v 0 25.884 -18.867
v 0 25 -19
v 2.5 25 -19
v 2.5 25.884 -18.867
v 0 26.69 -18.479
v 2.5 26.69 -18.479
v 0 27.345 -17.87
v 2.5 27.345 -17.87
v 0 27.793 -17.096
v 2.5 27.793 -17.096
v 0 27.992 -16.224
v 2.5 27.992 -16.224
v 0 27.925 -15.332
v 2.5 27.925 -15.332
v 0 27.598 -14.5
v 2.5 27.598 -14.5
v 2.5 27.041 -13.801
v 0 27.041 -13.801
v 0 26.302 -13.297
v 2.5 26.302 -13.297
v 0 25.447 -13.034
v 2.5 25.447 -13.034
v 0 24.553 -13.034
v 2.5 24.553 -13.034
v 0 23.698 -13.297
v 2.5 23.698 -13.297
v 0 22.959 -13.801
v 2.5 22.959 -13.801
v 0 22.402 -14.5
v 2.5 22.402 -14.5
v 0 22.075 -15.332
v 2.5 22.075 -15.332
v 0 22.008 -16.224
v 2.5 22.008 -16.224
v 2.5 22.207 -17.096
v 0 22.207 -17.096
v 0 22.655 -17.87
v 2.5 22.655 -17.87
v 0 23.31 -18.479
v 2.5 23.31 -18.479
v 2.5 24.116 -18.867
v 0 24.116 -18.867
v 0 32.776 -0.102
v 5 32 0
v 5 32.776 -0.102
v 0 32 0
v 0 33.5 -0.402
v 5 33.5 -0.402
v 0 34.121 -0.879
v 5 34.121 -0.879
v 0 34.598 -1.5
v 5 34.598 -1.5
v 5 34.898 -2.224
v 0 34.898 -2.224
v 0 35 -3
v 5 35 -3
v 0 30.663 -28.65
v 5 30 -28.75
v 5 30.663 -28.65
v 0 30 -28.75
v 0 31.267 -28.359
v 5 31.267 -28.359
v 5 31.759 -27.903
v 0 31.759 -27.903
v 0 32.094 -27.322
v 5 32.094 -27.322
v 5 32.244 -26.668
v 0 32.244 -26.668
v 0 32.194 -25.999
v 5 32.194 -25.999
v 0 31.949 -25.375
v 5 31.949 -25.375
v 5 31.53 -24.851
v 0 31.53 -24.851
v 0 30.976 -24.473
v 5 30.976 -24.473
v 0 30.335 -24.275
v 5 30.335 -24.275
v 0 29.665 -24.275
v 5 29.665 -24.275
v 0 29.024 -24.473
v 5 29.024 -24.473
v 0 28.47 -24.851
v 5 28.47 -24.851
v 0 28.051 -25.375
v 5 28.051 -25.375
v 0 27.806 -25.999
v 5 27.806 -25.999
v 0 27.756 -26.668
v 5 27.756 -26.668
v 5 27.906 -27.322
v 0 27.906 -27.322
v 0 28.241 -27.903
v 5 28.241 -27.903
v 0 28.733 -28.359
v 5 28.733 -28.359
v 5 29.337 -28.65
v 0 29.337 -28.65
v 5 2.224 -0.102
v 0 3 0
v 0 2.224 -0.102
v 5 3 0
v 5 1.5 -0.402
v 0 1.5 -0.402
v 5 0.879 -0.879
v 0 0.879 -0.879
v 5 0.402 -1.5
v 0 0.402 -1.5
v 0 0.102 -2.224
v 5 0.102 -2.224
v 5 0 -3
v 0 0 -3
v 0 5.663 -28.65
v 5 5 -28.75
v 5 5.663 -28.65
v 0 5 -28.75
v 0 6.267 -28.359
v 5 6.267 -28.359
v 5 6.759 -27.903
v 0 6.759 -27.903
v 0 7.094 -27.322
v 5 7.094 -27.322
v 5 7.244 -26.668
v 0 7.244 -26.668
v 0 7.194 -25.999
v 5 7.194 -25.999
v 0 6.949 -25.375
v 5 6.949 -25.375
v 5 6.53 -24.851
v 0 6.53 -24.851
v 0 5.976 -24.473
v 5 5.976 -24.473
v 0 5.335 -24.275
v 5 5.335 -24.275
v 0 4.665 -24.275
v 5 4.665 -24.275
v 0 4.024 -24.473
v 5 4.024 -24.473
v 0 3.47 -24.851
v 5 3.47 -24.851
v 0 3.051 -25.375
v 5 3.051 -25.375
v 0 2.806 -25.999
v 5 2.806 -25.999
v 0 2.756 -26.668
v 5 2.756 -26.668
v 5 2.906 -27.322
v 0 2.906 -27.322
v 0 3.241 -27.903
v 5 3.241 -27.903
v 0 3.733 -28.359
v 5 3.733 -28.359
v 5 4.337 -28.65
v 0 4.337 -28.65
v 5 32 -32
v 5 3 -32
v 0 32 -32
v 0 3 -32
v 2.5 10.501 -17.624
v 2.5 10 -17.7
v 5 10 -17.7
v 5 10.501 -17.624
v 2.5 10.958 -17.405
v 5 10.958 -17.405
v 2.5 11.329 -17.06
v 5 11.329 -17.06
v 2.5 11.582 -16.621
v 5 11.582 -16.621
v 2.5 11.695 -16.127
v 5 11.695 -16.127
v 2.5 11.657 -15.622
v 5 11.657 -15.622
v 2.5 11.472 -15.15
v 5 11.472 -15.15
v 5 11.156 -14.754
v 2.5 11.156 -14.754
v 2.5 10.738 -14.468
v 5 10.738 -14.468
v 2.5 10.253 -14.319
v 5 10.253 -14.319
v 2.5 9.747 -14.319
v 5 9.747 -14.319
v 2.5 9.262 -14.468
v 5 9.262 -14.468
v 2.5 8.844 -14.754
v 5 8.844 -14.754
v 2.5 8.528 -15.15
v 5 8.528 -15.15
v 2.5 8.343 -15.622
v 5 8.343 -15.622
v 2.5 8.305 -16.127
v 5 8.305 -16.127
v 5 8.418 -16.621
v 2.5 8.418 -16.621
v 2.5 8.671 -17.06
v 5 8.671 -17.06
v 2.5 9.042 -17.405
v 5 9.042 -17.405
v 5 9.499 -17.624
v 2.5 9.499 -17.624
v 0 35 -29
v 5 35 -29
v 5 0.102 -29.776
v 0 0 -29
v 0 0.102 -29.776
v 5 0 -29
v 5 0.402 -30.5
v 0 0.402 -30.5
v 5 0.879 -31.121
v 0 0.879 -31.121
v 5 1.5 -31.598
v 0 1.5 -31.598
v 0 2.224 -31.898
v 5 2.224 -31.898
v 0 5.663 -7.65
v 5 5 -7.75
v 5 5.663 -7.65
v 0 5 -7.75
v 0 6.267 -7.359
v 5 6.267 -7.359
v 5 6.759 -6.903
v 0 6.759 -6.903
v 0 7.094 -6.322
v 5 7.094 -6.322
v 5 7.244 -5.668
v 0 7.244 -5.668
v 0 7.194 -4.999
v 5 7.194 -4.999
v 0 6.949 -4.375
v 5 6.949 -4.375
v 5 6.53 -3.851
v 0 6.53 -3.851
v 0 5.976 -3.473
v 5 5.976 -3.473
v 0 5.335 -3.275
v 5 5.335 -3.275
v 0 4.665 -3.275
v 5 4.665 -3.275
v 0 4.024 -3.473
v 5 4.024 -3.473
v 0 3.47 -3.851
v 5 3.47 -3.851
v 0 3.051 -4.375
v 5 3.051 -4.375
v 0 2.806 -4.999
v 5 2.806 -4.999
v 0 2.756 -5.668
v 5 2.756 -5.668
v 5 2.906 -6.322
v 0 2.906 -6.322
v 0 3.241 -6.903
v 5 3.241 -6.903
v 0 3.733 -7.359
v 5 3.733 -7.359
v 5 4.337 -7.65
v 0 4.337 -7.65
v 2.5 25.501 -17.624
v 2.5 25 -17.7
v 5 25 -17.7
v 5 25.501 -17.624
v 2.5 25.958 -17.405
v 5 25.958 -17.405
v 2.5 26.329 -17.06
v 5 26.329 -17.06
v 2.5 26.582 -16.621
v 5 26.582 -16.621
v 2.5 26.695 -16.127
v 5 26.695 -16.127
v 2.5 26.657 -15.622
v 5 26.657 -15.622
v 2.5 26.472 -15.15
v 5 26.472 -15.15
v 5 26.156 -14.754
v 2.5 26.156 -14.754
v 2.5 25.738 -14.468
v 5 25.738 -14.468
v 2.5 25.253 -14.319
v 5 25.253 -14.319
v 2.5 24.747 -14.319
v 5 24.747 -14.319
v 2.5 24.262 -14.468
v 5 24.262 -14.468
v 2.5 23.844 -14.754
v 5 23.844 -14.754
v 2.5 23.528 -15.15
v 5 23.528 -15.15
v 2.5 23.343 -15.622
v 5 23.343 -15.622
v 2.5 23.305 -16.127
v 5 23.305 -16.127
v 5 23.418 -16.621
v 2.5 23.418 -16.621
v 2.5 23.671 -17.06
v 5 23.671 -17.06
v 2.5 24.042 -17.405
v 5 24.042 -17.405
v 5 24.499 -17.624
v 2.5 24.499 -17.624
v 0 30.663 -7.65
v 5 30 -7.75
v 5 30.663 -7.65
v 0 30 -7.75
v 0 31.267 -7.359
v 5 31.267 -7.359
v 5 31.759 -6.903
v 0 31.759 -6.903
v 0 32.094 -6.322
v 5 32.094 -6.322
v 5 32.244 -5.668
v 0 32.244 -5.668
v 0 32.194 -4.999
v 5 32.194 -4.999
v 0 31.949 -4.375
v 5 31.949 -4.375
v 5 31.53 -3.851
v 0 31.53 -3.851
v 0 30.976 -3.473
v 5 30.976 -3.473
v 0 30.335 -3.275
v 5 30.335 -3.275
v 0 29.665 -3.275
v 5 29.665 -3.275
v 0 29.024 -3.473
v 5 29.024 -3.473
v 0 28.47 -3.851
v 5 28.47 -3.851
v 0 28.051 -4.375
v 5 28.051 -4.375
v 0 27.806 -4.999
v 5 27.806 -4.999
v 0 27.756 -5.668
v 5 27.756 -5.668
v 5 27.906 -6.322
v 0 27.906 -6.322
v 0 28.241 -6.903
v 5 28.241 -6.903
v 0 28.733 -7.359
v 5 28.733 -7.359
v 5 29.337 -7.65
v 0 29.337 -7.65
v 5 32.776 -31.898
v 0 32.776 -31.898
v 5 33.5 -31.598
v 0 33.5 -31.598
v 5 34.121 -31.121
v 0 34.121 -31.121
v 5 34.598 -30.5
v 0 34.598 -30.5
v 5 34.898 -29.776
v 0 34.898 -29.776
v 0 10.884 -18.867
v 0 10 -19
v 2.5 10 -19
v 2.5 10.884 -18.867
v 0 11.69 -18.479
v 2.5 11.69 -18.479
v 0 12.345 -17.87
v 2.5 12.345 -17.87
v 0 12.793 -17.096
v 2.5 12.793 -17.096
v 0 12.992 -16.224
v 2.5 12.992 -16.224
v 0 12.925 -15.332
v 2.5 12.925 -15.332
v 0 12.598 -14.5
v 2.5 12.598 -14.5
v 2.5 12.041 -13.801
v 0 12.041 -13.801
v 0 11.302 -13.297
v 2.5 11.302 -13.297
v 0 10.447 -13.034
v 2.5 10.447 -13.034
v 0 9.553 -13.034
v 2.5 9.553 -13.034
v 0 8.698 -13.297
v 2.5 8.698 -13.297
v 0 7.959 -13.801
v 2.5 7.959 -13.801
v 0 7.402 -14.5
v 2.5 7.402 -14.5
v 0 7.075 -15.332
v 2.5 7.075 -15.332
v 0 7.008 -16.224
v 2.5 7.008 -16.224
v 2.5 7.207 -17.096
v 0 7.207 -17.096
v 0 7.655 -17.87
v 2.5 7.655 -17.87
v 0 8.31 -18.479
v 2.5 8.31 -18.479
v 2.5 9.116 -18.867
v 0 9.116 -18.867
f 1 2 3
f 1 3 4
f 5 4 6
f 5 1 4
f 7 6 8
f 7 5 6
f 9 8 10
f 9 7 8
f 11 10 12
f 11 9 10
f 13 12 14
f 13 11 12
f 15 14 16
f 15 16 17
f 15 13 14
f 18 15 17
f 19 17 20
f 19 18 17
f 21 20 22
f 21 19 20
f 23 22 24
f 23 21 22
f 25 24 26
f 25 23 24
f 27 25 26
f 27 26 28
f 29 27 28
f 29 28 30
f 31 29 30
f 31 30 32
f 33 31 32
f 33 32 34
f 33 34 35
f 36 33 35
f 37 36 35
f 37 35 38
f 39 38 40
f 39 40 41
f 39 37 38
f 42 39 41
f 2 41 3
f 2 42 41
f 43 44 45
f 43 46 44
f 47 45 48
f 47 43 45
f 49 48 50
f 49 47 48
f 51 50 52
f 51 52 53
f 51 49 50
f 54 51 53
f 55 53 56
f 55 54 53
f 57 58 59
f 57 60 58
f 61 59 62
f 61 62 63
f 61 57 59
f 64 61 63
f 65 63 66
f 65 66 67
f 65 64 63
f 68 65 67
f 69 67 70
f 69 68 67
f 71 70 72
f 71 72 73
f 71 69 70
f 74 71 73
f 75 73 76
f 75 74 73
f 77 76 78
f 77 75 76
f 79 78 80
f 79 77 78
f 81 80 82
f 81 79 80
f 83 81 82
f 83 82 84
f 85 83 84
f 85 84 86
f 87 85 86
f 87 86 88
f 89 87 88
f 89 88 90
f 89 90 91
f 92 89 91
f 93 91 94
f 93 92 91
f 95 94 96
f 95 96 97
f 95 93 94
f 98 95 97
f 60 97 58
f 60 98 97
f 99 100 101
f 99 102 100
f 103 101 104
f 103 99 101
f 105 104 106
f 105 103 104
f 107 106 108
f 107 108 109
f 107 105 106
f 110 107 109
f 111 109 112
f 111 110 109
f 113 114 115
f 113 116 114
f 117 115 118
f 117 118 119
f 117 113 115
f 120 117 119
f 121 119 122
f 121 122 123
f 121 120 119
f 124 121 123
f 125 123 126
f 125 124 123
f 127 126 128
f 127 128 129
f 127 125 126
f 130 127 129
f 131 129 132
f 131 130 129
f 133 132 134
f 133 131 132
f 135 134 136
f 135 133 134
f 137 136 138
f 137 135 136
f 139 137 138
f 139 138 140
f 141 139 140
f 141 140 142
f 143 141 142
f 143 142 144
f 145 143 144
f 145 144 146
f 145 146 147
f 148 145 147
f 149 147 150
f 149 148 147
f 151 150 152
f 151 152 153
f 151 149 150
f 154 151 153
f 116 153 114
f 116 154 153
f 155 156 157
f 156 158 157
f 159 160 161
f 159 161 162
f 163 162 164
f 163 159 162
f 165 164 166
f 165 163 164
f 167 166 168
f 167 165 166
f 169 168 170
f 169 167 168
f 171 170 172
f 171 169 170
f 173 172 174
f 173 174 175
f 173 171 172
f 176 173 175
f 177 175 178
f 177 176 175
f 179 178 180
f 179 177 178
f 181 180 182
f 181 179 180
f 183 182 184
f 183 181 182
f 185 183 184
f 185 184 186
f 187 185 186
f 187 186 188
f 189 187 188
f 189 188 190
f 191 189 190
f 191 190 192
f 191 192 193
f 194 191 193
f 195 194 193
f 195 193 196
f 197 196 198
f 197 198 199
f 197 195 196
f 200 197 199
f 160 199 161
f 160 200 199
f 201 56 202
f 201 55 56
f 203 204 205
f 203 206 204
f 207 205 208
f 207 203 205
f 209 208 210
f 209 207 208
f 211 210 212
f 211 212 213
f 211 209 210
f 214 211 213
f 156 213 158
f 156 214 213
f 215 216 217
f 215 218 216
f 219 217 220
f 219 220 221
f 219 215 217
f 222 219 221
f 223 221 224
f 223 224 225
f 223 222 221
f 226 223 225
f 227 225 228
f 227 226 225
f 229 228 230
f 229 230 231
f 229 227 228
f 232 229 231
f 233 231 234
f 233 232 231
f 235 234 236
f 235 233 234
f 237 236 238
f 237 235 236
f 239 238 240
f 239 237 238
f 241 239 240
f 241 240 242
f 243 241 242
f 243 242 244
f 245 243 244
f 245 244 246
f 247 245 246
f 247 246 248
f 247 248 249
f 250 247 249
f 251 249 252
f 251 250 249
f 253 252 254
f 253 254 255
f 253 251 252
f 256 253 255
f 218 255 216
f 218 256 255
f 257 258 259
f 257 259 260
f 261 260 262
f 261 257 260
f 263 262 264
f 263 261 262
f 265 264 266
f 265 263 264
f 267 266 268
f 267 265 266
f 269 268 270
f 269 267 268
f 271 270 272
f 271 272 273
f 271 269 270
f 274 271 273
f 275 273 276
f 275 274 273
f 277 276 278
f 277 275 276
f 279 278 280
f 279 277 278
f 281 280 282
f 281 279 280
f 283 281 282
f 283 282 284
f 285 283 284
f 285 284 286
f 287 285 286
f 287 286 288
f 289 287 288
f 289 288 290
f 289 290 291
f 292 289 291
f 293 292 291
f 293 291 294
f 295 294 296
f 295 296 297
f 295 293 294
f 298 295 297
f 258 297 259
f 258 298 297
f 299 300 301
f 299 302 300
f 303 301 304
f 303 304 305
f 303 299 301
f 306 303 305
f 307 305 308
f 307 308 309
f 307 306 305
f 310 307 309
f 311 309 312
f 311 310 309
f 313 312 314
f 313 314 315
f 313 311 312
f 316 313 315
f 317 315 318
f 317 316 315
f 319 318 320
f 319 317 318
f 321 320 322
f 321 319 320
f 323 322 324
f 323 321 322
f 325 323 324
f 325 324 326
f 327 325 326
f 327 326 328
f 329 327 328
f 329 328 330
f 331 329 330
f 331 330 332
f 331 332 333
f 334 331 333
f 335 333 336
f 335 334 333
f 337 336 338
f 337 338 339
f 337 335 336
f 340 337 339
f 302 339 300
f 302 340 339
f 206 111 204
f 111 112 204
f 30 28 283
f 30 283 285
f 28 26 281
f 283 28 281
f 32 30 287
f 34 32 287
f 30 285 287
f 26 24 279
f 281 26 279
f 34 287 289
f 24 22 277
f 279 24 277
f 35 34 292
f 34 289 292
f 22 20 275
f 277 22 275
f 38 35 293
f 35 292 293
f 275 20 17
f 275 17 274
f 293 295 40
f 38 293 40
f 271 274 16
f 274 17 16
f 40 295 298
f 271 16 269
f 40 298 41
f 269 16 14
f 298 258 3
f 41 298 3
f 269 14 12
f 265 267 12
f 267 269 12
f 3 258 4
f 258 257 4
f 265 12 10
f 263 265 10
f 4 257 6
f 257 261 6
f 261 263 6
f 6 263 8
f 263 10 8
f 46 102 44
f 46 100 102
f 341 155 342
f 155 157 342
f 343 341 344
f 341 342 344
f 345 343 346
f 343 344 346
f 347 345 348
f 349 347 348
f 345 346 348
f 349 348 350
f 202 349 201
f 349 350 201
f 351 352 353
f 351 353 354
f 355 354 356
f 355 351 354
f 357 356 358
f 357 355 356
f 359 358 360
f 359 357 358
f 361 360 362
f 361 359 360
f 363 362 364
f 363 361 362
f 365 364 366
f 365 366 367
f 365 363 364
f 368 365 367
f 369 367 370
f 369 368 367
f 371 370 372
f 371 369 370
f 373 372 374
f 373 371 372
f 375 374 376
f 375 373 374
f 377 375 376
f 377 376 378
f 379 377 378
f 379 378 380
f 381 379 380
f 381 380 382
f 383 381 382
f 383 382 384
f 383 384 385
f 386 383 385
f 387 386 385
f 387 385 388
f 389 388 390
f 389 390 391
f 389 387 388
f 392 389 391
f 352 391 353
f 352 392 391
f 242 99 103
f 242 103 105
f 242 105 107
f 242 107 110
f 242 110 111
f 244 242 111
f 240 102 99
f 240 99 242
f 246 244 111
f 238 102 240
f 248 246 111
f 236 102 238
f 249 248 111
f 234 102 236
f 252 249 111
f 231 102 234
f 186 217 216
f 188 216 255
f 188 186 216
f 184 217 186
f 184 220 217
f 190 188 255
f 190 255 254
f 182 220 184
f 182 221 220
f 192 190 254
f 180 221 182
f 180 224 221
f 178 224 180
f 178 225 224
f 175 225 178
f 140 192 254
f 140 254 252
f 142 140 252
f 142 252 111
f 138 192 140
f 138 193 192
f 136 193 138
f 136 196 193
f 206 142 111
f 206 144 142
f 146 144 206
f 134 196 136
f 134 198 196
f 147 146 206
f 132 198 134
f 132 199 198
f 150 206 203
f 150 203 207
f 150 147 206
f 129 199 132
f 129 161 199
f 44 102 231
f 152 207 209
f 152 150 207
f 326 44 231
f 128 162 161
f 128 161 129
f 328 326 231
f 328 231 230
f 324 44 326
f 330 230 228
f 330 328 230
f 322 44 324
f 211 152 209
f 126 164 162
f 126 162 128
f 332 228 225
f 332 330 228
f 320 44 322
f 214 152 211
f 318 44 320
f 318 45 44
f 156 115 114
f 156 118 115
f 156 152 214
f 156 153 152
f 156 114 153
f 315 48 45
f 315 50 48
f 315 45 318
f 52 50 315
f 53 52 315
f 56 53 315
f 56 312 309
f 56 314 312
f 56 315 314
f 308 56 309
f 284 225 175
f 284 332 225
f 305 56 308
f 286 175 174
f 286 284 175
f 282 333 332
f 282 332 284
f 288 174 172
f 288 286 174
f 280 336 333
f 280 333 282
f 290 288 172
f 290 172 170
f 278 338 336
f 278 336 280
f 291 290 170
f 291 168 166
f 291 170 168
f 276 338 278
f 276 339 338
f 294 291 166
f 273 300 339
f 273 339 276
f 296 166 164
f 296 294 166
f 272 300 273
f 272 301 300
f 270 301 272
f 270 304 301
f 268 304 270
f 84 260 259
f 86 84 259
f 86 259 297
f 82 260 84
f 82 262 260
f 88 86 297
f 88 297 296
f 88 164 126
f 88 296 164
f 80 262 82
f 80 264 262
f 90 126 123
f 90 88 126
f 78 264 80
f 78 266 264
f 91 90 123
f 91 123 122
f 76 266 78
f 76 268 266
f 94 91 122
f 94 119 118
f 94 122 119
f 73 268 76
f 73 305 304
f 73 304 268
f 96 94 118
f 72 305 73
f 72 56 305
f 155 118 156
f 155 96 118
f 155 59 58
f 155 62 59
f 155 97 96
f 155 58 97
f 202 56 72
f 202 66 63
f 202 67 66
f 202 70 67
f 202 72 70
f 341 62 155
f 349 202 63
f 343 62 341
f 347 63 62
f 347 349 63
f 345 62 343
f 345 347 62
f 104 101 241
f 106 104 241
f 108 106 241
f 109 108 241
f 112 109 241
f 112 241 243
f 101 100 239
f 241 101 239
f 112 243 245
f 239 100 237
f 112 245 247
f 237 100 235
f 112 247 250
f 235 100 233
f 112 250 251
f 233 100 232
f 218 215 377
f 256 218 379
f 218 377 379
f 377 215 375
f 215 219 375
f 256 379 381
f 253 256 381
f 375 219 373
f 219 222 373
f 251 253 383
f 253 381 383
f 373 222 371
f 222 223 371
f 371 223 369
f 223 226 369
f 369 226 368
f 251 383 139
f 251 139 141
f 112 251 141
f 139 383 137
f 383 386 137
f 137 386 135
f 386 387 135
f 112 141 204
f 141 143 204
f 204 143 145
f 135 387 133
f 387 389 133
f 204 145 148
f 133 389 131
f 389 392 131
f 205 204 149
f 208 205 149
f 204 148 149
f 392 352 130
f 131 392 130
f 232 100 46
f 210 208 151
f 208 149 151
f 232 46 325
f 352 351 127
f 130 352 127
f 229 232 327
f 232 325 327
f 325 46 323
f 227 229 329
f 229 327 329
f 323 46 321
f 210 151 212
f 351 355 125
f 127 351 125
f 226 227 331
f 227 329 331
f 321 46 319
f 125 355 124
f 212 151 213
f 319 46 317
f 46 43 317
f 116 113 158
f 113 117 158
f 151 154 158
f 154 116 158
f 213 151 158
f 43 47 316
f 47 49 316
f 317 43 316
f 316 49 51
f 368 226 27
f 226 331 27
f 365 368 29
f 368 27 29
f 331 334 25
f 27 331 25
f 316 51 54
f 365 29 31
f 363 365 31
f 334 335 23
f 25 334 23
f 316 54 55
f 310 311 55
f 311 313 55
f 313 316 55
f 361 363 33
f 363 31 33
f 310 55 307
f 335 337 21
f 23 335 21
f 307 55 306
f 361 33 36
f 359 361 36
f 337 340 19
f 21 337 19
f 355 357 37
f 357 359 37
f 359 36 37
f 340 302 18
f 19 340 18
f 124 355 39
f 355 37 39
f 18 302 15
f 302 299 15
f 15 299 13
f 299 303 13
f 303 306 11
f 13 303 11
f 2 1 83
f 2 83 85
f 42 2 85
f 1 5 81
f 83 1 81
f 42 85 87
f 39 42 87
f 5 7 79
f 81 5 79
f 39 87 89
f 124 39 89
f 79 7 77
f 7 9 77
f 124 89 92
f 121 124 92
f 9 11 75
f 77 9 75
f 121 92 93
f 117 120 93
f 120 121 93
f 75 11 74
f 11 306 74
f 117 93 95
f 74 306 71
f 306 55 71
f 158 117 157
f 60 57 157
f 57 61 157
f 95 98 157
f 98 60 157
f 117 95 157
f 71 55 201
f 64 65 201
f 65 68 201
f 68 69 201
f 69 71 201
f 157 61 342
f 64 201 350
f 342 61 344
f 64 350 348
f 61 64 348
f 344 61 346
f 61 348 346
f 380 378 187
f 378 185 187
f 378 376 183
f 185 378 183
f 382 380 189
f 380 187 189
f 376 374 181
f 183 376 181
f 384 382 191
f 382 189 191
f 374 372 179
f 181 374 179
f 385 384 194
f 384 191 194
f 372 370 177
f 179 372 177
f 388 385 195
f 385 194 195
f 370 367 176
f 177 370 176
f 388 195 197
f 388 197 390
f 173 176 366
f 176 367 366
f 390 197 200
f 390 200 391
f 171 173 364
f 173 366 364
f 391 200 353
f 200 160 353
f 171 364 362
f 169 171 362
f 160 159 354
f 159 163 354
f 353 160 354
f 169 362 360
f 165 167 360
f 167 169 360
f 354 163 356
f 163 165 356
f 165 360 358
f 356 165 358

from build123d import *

# Parameters (mm, degrees)
SKETCH_1_W      = 32
SKETCH_1_H      = 35
SKETCH_1_R      = 2.25
SKETCH_1_R_2    = 3
EXTRUDE_1_DEPTH = 2.5
SKETCH_2_W      = 32
SKETCH_2_H      = 35
SKETCH_2_R      = 2.25
SKETCH_2_R_2    = 1.7
EXTRUDE_2_DEPTH = 2.5
FILLET_1_R      = 3


with BuildPart() as part:
    # 草图1 → 凸台-拉伸1 (new body)
    with BuildSketch(Plane(origin=(0, 0, 0), x_dir=(0, 0, -1), z_dir=(1, 0, 0))):
        with Locations((16, 17.5)):
            Rectangle(SKETCH_1_W, SKETCH_1_H)
        with Locations((5.5, 30)):
            Circle(SKETCH_1_R, mode=Mode.SUBTRACT)
        with Locations((26.5, 30)):
            Circle(SKETCH_1_R, mode=Mode.SUBTRACT)
        with Locations((5.5, 5)):
            Circle(SKETCH_1_R, mode=Mode.SUBTRACT)
        with Locations((26.5, 5)):
            Circle(SKETCH_1_R, mode=Mode.SUBTRACT)
        with Locations((16, 25)):
            Circle(SKETCH_1_R_2, mode=Mode.SUBTRACT)
        with Locations((16, 10)):
            Circle(SKETCH_1_R_2, mode=Mode.SUBTRACT)
    extrude(amount=EXTRUDE_1_DEPTH)

    # 草图2 → 凸台-拉伸2 (add)
    with BuildSketch(Plane(origin=(2.5, 0, 0), x_dir=(0, 0, -1), z_dir=(1, 0, 0))):
        with Locations((16, 17.5)):
            Rectangle(SKETCH_2_W, SKETCH_2_H)
        with Locations((26.5, 5)):
            Circle(SKETCH_2_R, mode=Mode.SUBTRACT)
        with Locations((5.5, 5)):
            Circle(SKETCH_2_R, mode=Mode.SUBTRACT)
        with Locations((26.5, 30)):
            Circle(SKETCH_2_R, mode=Mode.SUBTRACT)
        with Locations((5.5, 30)):
            Circle(SKETCH_2_R, mode=Mode.SUBTRACT)
        with Locations((16, 25)):
            Circle(SKETCH_2_R_2, mode=Mode.SUBTRACT)
        with Locations((16, 10)):
            Circle(SKETCH_2_R_2, mode=Mode.SUBTRACT)
    extrude(amount=EXTRUDE_2_DEPTH)

    # 圆角1
    fillet_1_edges = [part.edges().sort_by_distance(p)[0] for p in [
        (2.5, 35, 0),
        (2.5, 35, -32),
        (2.5, 0, -32),
        (2.5, 0, 0),
    ]]
    fillet(fillet_1_edges, radius=FILLET_1_R)


solid = part.part
